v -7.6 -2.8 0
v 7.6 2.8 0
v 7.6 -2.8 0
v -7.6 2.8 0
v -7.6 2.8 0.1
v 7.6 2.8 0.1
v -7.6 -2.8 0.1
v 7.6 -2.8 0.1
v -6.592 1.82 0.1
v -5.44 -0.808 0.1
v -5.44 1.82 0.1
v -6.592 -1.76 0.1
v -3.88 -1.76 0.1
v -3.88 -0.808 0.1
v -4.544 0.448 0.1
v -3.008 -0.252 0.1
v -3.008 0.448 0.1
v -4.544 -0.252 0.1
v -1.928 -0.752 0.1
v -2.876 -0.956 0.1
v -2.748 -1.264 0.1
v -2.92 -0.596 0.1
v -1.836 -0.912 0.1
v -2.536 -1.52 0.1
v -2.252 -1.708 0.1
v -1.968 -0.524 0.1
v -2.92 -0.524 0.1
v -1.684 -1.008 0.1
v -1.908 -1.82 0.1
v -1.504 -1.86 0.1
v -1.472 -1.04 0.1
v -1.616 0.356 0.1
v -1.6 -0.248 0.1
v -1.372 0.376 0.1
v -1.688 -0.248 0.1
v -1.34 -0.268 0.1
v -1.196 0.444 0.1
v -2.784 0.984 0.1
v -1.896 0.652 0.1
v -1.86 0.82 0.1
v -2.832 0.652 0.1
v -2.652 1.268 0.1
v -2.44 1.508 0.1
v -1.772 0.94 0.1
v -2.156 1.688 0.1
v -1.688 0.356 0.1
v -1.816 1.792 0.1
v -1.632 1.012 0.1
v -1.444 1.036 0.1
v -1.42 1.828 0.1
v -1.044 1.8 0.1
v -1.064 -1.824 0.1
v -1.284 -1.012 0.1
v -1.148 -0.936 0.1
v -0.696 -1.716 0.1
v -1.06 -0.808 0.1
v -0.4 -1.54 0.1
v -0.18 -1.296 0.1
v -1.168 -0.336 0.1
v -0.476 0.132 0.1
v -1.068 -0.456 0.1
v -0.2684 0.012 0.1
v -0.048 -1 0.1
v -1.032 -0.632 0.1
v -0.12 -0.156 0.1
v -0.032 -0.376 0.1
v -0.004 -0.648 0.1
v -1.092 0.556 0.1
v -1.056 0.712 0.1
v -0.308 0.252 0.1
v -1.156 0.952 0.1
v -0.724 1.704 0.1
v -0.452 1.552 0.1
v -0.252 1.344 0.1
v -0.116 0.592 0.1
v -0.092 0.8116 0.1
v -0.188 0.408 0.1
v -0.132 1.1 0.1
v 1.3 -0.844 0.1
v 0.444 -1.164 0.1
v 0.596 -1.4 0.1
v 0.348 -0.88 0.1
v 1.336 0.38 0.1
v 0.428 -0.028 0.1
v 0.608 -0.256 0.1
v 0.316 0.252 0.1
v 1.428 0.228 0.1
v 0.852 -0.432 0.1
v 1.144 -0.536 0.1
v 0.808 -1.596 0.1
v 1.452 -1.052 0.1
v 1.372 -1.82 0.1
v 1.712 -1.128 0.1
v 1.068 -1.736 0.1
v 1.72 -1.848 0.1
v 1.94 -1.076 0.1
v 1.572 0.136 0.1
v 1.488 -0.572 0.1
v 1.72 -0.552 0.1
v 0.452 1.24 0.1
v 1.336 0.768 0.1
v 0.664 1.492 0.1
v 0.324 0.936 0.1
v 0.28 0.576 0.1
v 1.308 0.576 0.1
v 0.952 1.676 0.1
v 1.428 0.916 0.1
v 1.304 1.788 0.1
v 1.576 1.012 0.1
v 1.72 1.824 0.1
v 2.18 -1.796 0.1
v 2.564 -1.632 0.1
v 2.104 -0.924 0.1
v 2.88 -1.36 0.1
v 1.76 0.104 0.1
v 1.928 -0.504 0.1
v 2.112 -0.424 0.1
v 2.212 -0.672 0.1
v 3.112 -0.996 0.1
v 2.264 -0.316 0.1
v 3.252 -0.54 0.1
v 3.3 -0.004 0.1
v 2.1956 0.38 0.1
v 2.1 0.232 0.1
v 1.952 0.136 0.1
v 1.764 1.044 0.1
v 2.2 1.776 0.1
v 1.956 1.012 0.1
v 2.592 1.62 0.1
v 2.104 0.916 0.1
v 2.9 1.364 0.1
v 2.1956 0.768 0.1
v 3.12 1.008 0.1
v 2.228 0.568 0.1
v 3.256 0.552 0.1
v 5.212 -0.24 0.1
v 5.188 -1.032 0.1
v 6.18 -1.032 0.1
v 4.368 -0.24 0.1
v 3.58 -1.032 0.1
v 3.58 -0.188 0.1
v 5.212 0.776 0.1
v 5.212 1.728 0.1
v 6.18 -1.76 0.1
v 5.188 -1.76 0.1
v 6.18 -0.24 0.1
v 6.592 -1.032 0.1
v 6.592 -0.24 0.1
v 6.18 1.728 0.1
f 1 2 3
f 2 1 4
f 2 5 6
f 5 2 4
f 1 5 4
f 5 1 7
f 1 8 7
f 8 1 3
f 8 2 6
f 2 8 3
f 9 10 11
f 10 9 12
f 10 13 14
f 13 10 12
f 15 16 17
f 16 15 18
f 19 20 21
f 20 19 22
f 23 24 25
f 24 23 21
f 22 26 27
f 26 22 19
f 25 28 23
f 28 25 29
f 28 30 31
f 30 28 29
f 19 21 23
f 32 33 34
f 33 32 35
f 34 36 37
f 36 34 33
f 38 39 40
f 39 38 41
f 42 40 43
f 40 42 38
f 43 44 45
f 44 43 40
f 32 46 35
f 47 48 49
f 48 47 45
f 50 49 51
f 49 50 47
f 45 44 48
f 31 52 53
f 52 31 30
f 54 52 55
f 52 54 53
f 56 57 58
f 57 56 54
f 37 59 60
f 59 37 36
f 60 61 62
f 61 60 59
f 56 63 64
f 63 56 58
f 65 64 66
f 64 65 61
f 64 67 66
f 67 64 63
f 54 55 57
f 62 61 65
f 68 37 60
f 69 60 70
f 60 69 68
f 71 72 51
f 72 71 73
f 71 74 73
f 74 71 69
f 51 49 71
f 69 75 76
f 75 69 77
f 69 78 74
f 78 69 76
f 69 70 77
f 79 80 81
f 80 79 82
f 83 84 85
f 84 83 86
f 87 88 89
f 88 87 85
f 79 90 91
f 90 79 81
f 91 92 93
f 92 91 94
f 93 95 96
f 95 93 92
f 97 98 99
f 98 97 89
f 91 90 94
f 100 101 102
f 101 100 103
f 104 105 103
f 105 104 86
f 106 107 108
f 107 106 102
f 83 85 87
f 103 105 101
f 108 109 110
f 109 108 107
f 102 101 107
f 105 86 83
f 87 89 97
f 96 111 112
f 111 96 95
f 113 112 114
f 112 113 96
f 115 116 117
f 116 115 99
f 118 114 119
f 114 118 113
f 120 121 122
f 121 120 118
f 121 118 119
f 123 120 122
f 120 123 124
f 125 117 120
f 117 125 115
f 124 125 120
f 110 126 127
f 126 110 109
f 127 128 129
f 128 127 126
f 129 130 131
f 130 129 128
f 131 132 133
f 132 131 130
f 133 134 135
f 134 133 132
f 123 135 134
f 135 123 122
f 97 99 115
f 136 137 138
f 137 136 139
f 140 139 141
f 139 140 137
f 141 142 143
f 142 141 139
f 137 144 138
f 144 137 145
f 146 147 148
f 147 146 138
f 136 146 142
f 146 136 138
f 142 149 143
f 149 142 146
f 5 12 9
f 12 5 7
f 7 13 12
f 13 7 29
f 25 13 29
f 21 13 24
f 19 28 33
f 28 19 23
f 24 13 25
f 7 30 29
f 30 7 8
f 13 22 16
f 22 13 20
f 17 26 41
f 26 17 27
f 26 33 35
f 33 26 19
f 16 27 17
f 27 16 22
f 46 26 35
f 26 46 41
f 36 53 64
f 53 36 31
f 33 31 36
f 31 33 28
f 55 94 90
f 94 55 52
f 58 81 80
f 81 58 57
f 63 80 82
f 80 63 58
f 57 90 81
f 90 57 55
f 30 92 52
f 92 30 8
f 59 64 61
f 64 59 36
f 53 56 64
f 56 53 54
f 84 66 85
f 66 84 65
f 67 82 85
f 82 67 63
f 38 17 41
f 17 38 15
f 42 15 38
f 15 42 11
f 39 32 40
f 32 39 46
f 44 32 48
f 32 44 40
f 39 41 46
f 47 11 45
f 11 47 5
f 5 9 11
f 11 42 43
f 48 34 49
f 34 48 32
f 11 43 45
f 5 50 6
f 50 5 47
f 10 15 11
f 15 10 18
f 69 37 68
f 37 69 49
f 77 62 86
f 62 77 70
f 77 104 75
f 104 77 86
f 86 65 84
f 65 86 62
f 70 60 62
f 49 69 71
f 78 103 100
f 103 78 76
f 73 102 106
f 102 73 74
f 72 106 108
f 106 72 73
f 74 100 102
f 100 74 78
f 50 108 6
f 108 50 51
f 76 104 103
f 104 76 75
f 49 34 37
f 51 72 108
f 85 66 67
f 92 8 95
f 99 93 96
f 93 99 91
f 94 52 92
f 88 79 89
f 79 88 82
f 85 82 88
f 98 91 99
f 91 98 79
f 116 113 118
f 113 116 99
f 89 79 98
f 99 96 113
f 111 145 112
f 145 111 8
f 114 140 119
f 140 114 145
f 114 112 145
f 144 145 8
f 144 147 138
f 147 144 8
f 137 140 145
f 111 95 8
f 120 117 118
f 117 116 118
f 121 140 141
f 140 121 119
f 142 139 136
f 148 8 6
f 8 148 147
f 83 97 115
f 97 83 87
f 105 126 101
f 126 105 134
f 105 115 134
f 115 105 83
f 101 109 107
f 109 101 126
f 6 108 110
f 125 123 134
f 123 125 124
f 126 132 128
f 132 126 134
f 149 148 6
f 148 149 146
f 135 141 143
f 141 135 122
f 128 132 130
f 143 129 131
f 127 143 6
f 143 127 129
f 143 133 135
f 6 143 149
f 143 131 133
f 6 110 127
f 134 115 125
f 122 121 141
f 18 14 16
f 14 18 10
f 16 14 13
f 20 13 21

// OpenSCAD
// file: ../p/box5-12.scad
use <../lib.scad>
function ldraw_lib__box5_12() = [
// 0 Box with 5 Faces without Any Edges
// 0 Name: box5-12.dat
// 0 Author: Chris Dee [cwdee]
// 0 !LDRAW_ORG Primitive UPDATE 2009-02
// 0 !LICENSE Licensed under CC BY 4.0 : see CAreadme.txt
// 
// 0 BFC CERTIFY CCW
  [0,"BFC","CERTIFY"],
  [0,"BFC","CCW"],
// 
// 0 !HISTORY 2009-09-03 [PTadmin] Official Update 2009-02
// 
// 
// 4 16 1 1 1 1 1 -1 -1 1 -1 -1 1 1
  [4,16,1,1,1,1,1,-1,-1,1,-1,-1,1,1],
// 4 16 -1 0 1 1 0 1 1 1 1 -1 1 1
  [4,16,-1,0,1,1,0,1,1,1,1,-1,1,1],
// 4 16 -1 0 -1 -1 0 1 -1 1 1 -1 1 -1
  [4,16,-1,0,-1,-1,0,1,-1,1,1,-1,1,-1],
// 4 16 1 0 -1 -1 0 -1 -1 1 -1 1 1 -1
  [4,16,1,0,-1,-1,0,-1,-1,1,-1,1,1,-1],
// 4 16 1 0 1 1 0 -1 1 1 -1 1 1 1
  [4,16,1,0,1,1,0,-1,1,1,-1,1,1,1],
// 0
];
module ldraw_lib__box5_12(step=0, col=false, unit=2/5, alt=false, line=0.2, solid=!$preview)
    makepoly(ldraw_lib__box5_12(), step=step, col=col, unit=unit, alt=alt, line=line, solid=solid);
ldraw_lib__box5_12(line=0.2);
// main file
use <../lib.scad>
use <../p/box5-12.scad>
function ldraw_lib__004848b() = [
// 0 Sticker  0.7 x  1.9 with Black "L-394" on Yellow Background
// 0 Name: 004848b.dat
// 0 Author: Takeshi Takahashi [RainbowDolphin]
// 0 !LDRAW_ORG Part UPDATE 2022-04
// 0 !LICENSE Licensed under CC BY 4.0 : see CAreadme.txt
// 
// 0 BFC CERTIFY CCW
  [0,"BFC","CERTIFY"],
  [0,"BFC","CCW"],
// 
// 0 !KEYWORDS FLH 1200, Harley-Davidson, License plate, Police motorcycle
// 0 !KEYWORDS Set 394-1
// 
// 0 !HISTORY 2022-07-18 [PTadmin] Official Update 2022-04
// 
// 
// 0 // Font: Swiss721 BT Black, except hyphen
// 
// 1 16 0 -0.25 0 19 0 0 0 0.25 0 0 0 7 box5-12.dat
  [1,16,0,-0.25,0,19,0,0,0,0.25,0,0,0,7, ldraw_lib__box5_12()],
// 4 0 -16.48 -0.25 4.55 -16.48 -0.25 -4.4 -13.6 -0.25 -2.02 -13.6 -0.25 4.55
  [4,0,-16.48,-0.25,4.55,-16.48,-0.25,-4.4,-13.6,-0.25,-2.02,-13.6,-0.25,4.55],
// 4 0 -13.6 -0.25 -2.02 -16.48 -0.25 -4.4 -9.7 -0.25 -4.4 -9.7 -0.25 -2.02
  [4,0,-13.6,-0.25,-2.02,-16.48,-0.25,-4.4,-9.7,-0.25,-4.4,-9.7,-0.25,-2.02],
// 4 0 -11.36 -0.25 1.12 -11.36 -0.25 -0.63 -7.52 -0.25 -0.63 -7.52 -0.25 1.12
  [4,0,-11.36,-0.25,1.12,-11.36,-0.25,-0.63,-7.52,-0.25,-0.63,-7.52,-0.25,1.12],
// 4 0 -7.19 -0.25 -2.39 -6.87 -0.25 -3.16 -4.82 -0.25 -1.88 -7.3 -0.25 -1.49
  [4,0,-7.19,-0.25,-2.39,-6.87,-0.25,-3.16,-4.82,-0.25,-1.88,-7.3,-0.25,-1.49],
// 4 0 -4.59 -0.25 -2.28 -6.87 -0.25 -3.16 -6.34 -0.25 -3.8 -5.63 -0.25 -4.27
  [4,0,-4.59,-0.25,-2.28,-6.87,-0.25,-3.16,-6.34,-0.25,-3.8,-5.63,-0.25,-4.27],
// 4 0 -4.92 -0.25 -1.31 -7.3 -0.25 -1.31 -7.3 -0.25 -1.49 -4.82 -0.25 -1.88
  [4,0,-4.92,-0.25,-1.31,-7.3,-0.25,-1.31,-7.3,-0.25,-1.49,-4.82,-0.25,-1.88],
// 4 0 -4.21 -0.25 -2.52 -4.59 -0.25 -2.28 -5.63 -0.25 -4.27 -4.77 -0.25 -4.55
  [4,0,-4.21,-0.25,-2.52,-4.59,-0.25,-2.28,-5.63,-0.25,-4.27,-4.77,-0.25,-4.55],
// 4 0 -4.21 -0.25 -2.52 -4.77 -0.25 -4.55 -3.76 -0.25 -4.65 -3.68 -0.25 -2.6
  [4,0,-4.21,-0.25,-2.52,-4.77,-0.25,-4.55,-3.76,-0.25,-4.65,-3.68,-0.25,-2.6],
// 3 0 -4.82 -0.25 -1.88 -6.87 -0.25 -3.16 -4.59 -0.25 -2.28
  [3,0,-4.82,-0.25,-1.88,-6.87,-0.25,-3.16,-4.59,-0.25,-2.28],
// 4 0 -4.04 -0.25 0.89 -4.22 -0.25 -0.62 -4 -0.25 -0.62 -3.43 -0.25 0.94
  [4,0,-4.04,-0.25,0.89,-4.22,-0.25,-0.62,-4,-0.25,-0.62,-3.43,-0.25,0.94],
// 4 0 -3.43 -0.25 0.94 -4 -0.25 -0.62 -3.35 -0.25 -0.67 -2.99 -0.25 1.11
  [4,0,-3.43,-0.25,0.94,-4,-0.25,-0.62,-3.35,-0.25,-0.67,-2.99,-0.25,1.11],
// 4 0 -6.96 -0.25 2.46 -7.08 -0.25 1.63 -4.74 -0.25 1.63 -4.65 -0.25 2.05
  [4,0,-6.96,-0.25,2.46,-7.08,-0.25,1.63,-4.74,-0.25,1.63,-4.65,-0.25,2.05],
// 4 0 -6.63 -0.25 3.17 -6.96 -0.25 2.46 -4.65 -0.25 2.05 -6.1 -0.25 3.77
  [4,0,-6.63,-0.25,3.17,-6.96,-0.25,2.46,-4.65,-0.25,2.05,-6.1,-0.25,3.77],
// 4 0 -4.43 -0.25 2.35 -5.39 -0.25 4.22 -6.1 -0.25 3.77 -4.65 -0.25 2.05
  [4,0,-4.43,-0.25,2.35,-5.39,-0.25,4.22,-6.1,-0.25,3.77,-4.65,-0.25,2.05],
// 3 0 -4.04 -0.25 0.89 -4.22 -0.25 0.89 -4.22 -0.25 -0.62
  [3,0,-4.04,-0.25,0.89,-4.22,-0.25,0.89,-4.22,-0.25,-0.62],
// 4 0 -4.08 -0.25 2.53 -3.61 -0.25 2.59 -4.54 -0.25 4.48 -5.39 -0.25 4.22
  [4,0,-4.08,-0.25,2.53,-3.61,-0.25,2.59,-4.54,-0.25,4.48,-5.39,-0.25,4.22],
// 4 0 -3.55 -0.25 4.57 -4.54 -0.25 4.48 -3.61 -0.25 2.59 -2.61 -0.25 4.5
  [4,0,-3.55,-0.25,4.57,-4.54,-0.25,4.48,-3.61,-0.25,2.59,-2.61,-0.25,4.5],
// 3 0 -5.39 -0.25 4.22 -4.43 -0.25 2.35 -4.08 -0.25 2.53
  [3,0,-5.39,-0.25,4.22,-4.43,-0.25,2.35,-4.08,-0.25,2.53],
// 4 0 -3.21 -0.25 -2.53 -3.68 -0.25 -2.6 -3.76 -0.25 -4.65 -2.66 -0.25 -4.56
  [4,0,-3.21,-0.25,-2.53,-3.68,-0.25,-2.6,-3.76,-0.25,-4.65,-2.66,-0.25,-4.56],
// 4 0 -1.74 -0.25 -4.29 -2.87 -0.25 -2.34 -3.21 -0.25 -2.53 -2.66 -0.25 -4.56
  [4,0,-1.74,-0.25,-4.29,-2.87,-0.25,-2.34,-3.21,-0.25,-2.53,-2.66,-0.25,-4.56],
// 4 0 -2.65 -0.25 -2.02 -2.87 -0.25 -2.34 -1 -0.25 -3.85 -0.45 -0.25 -3.24
  [4,0,-2.65,-0.25,-2.02,-2.87,-0.25,-2.34,-1,-0.25,-3.85,-0.45,-0.25,-3.24],
// 4 0 -2.99 -0.25 1.11 -3.35 -0.25 -0.67 -2.92 -0.25 -0.84 -1.19 -0.25 0.33
  [4,0,-2.99,-0.25,1.11,-3.35,-0.25,-0.67,-2.92,-0.25,-0.84,-1.19,-0.25,0.33],
// 4 0 -1.19 -0.25 0.33 -2.92 -0.25 -0.84 -2.67 -0.25 -1.14 -0.671 -0.25 0.03
  [4,0,-1.19,-0.25,0.33,-2.92,-0.25,-0.84,-2.67,-0.25,-1.14,-0.671,-0.25,0.03],
// 4 0 -2.65 -0.25 -2.02 -0.45 -0.25 -3.24 -0.12 -0.25 -2.5 -2.58 -0.25 -1.58
  [4,0,-2.65,-0.25,-2.02,-0.45,-0.25,-3.24,-0.12,-0.25,-2.5,-2.58,-0.25,-1.58],
// 4 0 -0.3 -0.25 -0.39 -2.67 -0.25 -1.14 -2.58 -0.25 -1.58 -0.08 -0.25 -0.94
  [4,0,-0.3,-0.25,-0.39,-2.67,-0.25,-1.14,-2.58,-0.25,-1.58,-0.08,-0.25,-0.94],
// 4 0 -0.01 -0.25 -1.62 -0.08 -0.25 -0.94 -2.58 -0.25 -1.58 -0.12 -0.25 -2.5
  [4,0,-0.01,-0.25,-1.62,-0.08,-0.25,-0.94,-2.58,-0.25,-1.58,-0.12,-0.25,-2.5],
// 3 0 -2.87 -0.25 -2.34 -1.74 -0.25 -4.29 -1 -0.25 -3.85
  [3,0,-2.87,-0.25,-2.34,-1.74,-0.25,-4.29,-1,-0.25,-3.85],
// 3 0 -0.671 -0.25 0.03 -2.67 -0.25 -1.14 -0.3 -0.25 -0.39
  [3,0,-0.671,-0.25,0.03,-2.67,-0.25,-1.14,-0.3,-0.25,-0.39],
// 3 0 -2.73 -0.25 1.39 -2.99 -0.25 1.11 -1.19 -0.25 0.33
  [3,0,-2.73,-0.25,1.39,-2.99,-0.25,1.11,-1.19,-0.25,0.33],
// 4 0 -2.64 -0.25 1.78 -2.73 -0.25 1.39 -1.19 -0.25 0.33 -0.77 -0.25 0.63
  [4,0,-2.64,-0.25,1.78,-2.73,-0.25,1.39,-1.19,-0.25,0.33,-0.77,-0.25,0.63],
// 4 0 -2.89 -0.25 2.38 -1.13 -0.25 3.88 -1.81 -0.25 4.26 -2.61 -0.25 4.5
  [4,0,-2.89,-0.25,2.38,-1.13,-0.25,3.88,-1.81,-0.25,4.26,-2.61,-0.25,4.5],
// 4 0 -2.89 -0.25 2.38 -2.64 -0.25 1.78 -0.63 -0.25 3.36 -1.13 -0.25 3.88
  [4,0,-2.89,-0.25,2.38,-2.64,-0.25,1.78,-0.63,-0.25,3.36,-1.13,-0.25,3.88],
// 3 0 -2.61 -0.25 4.5 -3.61 -0.25 2.59 -2.89 -0.25 2.38
  [3,0,-2.61,-0.25,4.5,-3.61,-0.25,2.59,-2.89,-0.25,2.38],
// 4 0 -2.64 -0.25 1.78 -0.47 -0.25 1.02 -0.29 -0.25 1.48 -0.23 -0.25 2.029
  [4,0,-2.64,-0.25,1.78,-0.47,-0.25,1.02,-0.29,-0.25,1.48,-0.23,-0.25,2.029],
// 4 0 -0.33 -0.25 2.75 -0.63 -0.25 3.36 -2.64 -0.25 1.78 -0.23 -0.25 2.029
  [4,0,-0.33,-0.25,2.75,-0.63,-0.25,3.36,-2.64,-0.25,1.78,-0.23,-0.25,2.029],
// 3 0 -2.64 -0.25 1.78 -0.77 -0.25 0.63 -0.47 -0.25 1.02
  [3,0,-2.64,-0.25,1.78,-0.77,-0.25,0.63,-0.47,-0.25,1.02],
// 4 0 1.11 -0.25 -2.91 1.49 -0.25 -3.5 3.25 -0.25 -2.11 0.87 -0.25 -2.2
  [4,0,1.11,-0.25,-2.91,1.49,-0.25,-3.5,3.25,-0.25,-2.11,0.87,-0.25,-2.2],
// 4 0 1.07 -0.25 -0.07 1.52 -0.25 -0.64 3.34 -0.25 0.95 0.79 -0.25 0.63
  [4,0,1.07,-0.25,-0.07,1.52,-0.25,-0.64,3.34,-0.25,0.95,0.79,-0.25,0.63],
// 4 0 3.57 -0.25 0.57 1.52 -0.25 -0.64 2.13 -0.25 -1.08 2.86 -0.25 -1.34
  [4,0,3.57,-0.25,0.57,1.52,-0.25,-0.64,2.13,-0.25,-1.08,2.86,-0.25,-1.34],
// 4 0 3.25 -0.25 -2.11 1.49 -0.25 -3.5 2.02 -0.25 -3.99 3.63 -0.25 -2.63
  [4,0,3.25,-0.25,-2.11,1.49,-0.25,-3.5,2.02,-0.25,-3.99,3.63,-0.25,-2.63],
// 4 0 3.63 -0.25 -2.63 2.67 -0.25 -4.34 3.43 -0.25 -4.55 4.28 -0.25 -2.82
  [4,0,3.63,-0.25,-2.63,2.67,-0.25,-4.34,3.43,-0.25,-4.55,4.28,-0.25,-2.82],
// 4 0 4.28 -0.25 -2.82 3.43 -0.25 -4.55 4.3 -0.25 -4.62 4.85 -0.25 -2.69
  [4,0,4.28,-0.25,-2.82,3.43,-0.25,-4.55,4.3,-0.25,-4.62,4.85,-0.25,-2.69],
// 4 0 3.72 -0.25 -1.43 4.3 -0.25 -1.38 3.93 -0.25 0.34 2.86 -0.25 -1.34
  [4,0,3.72,-0.25,-1.43,4.3,-0.25,-1.38,3.93,-0.25,0.34,2.86,-0.25,-1.34],
// 3 0 3.63 -0.25 -2.63 2.02 -0.25 -3.99 2.67 -0.25 -4.34
  [3,0,3.63,-0.25,-2.63,2.02,-0.25,-3.99,2.67,-0.25,-4.34],
// 4 0 1.13 -0.25 3.1 0.81 -0.25 2.34 3.34 -0.25 1.92 1.66 -0.25 3.73
  [4,0,1.13,-0.25,3.1,0.81,-0.25,2.34,3.34,-0.25,1.92,1.66,-0.25,3.73],
// 4 0 3.27 -0.25 1.44 0.81 -0.25 2.34 0.7 -0.25 1.44 0.79 -0.25 0.63
  [4,0,3.27,-0.25,1.44,0.81,-0.25,2.34,0.7,-0.25,1.44,0.79,-0.25,0.63],
// 4 0 2.38 -0.25 4.19 1.66 -0.25 3.73 3.57 -0.25 2.29 3.26 -0.25 4.47
  [4,0,2.38,-0.25,4.19,1.66,-0.25,3.73,3.57,-0.25,2.29,3.26,-0.25,4.47],
// 3 0 3.34 -0.25 0.95 1.52 -0.25 -0.64 3.57 -0.25 0.57
  [3,0,3.34,-0.25,0.95,1.52,-0.25,-0.64,3.57,-0.25,0.57],
// 3 0 0.81 -0.25 2.34 3.27 -0.25 1.44 3.34 -0.25 1.92
  [3,0,0.81,-0.25,2.34,3.27,-0.25,1.44,3.34,-0.25,1.92],
// 4 0 3.26 -0.25 4.47 3.57 -0.25 2.29 3.94 -0.25 2.53 4.3 -0.25 4.56
  [4,0,3.26,-0.25,4.47,3.57,-0.25,2.29,3.94,-0.25,2.53,4.3,-0.25,4.56],
// 3 0 1.66 -0.25 3.73 3.34 -0.25 1.92 3.57 -0.25 2.29
  [3,0,1.66,-0.25,3.73,3.34,-0.25,1.92,3.57,-0.25,2.29],
// 3 0 3.27 -0.25 1.44 0.79 -0.25 0.63 3.34 -0.25 0.95
  [3,0,3.27,-0.25,1.44,0.79,-0.25,0.63,3.34,-0.25,0.95],
// 3 0 3.57 -0.25 0.57 2.86 -0.25 -1.34 3.93 -0.25 0.34
  [3,0,3.57,-0.25,0.57,2.86,-0.25,-1.34,3.93,-0.25,0.34],
// 4 0 4.85 -0.25 -2.69 4.3 -0.25 -4.62 5.45 -0.25 -4.49 6.41 -0.25 -4.08
  [4,0,4.85,-0.25,-2.69,4.3,-0.25,-4.62,5.45,-0.25,-4.49,6.41,-0.25,-4.08],
// 4 0 5.26 -0.25 -2.31 4.85 -0.25 -2.69 6.41 -0.25 -4.08 7.2 -0.25 -3.4
  [4,0,5.26,-0.25,-2.31,4.85,-0.25,-2.69,6.41,-0.25,-4.08,7.2,-0.25,-3.4],
// 4 0 4.4 -0.25 0.26 4.3 -0.25 -1.38 4.82 -0.25 -1.26 5.28 -0.25 -1.06
  [4,0,4.4,-0.25,0.26,4.3,-0.25,-1.38,4.82,-0.25,-1.26,5.28,-0.25,-1.06],
// 4 0 5.53 -0.25 -1.68 5.26 -0.25 -2.31 7.2 -0.25 -3.4 7.78 -0.25 -2.49
  [4,0,5.53,-0.25,-1.68,5.26,-0.25,-2.31,7.2,-0.25,-3.4,7.78,-0.25,-2.49],
// 4 0 5.66 -0.25 -0.79 5.53 -0.25 -1.68 8.13 -0.25 -1.35 8.25 -0.25 -0.01
  [4,0,5.66,-0.25,-0.79,5.53,-0.25,-1.68,8.13,-0.25,-1.35,8.25,-0.25,-0.01],
// 3 0 8.13 -0.25 -1.35 5.53 -0.25 -1.68 7.78 -0.25 -2.49
  [3,0,8.13,-0.25,-1.35,5.53,-0.25,-1.68,7.78,-0.25,-2.49],
// 4 0 5.66 -0.25 -0.79 8.25 -0.25 -0.01 5.489 -0.25 0.95 5.25 -0.25 0.58
  [4,0,5.66,-0.25,-0.79,8.25,-0.25,-0.01,5.489,-0.25,0.95,5.25,-0.25,0.58],
// 4 0 5.28 -0.25 -1.06 5.66 -0.25 -0.79 4.88 -0.25 0.34 4.4 -0.25 0.26
  [4,0,5.28,-0.25,-1.06,5.66,-0.25,-0.79,4.88,-0.25,0.34,4.4,-0.25,0.26],
// 3 0 5.25 -0.25 0.58 4.88 -0.25 0.34 5.66 -0.25 -0.79
  [3,0,5.25,-0.25,0.58,4.88,-0.25,0.34,5.66,-0.25,-0.79],
// 4 0 4.41 -0.25 2.61 5.5 -0.25 4.44 4.3 -0.25 4.56 3.94 -0.25 2.53
  [4,0,4.41,-0.25,2.61,5.5,-0.25,4.44,4.3,-0.25,4.56,3.94,-0.25,2.53],
// 4 0 5.5 -0.25 4.44 4.41 -0.25 2.61 4.89 -0.25 2.53 6.48 -0.25 4.05
  [4,0,5.5,-0.25,4.44,4.41,-0.25,2.61,4.89,-0.25,2.53,6.48,-0.25,4.05],
// 4 0 6.48 -0.25 4.05 4.89 -0.25 2.53 5.26 -0.25 2.29 7.25 -0.25 3.41
  [4,0,6.48,-0.25,4.05,4.89,-0.25,2.53,5.26,-0.25,2.29,7.25,-0.25,3.41],
// 4 0 7.25 -0.25 3.41 5.26 -0.25 2.29 5.489 -0.25 1.92 7.8 -0.25 2.52
  [4,0,7.25,-0.25,3.41,5.26,-0.25,2.29,5.489,-0.25,1.92,7.8,-0.25,2.52],
// 4 0 7.8 -0.25 2.52 5.489 -0.25 1.92 5.57 -0.25 1.42 8.14 -0.25 1.38
  [4,0,7.8,-0.25,2.52,5.489,-0.25,1.92,5.57,-0.25,1.42,8.14,-0.25,1.38],
// 4 0 8.14 -0.25 1.38 5.57 -0.25 1.42 5.489 -0.25 0.95 8.25 -0.25 -0.01
  [4,0,8.14,-0.25,1.38,5.57,-0.25,1.42,5.489,-0.25,0.95,8.25,-0.25,-0.01],
// 3 0 3.93 -0.25 0.34 4.3 -0.25 -1.38 4.4 -0.25 0.26
  [3,0,3.93,-0.25,0.34,4.3,-0.25,-1.38,4.4,-0.25,0.26],
// 4 0 12.97 -0.25 -2.58 15.45 -0.25 -2.58 13.03 -0.25 -0.6 10.92 -0.25 -0.6
  [4,0,12.97,-0.25,-2.58,15.45,-0.25,-2.58,13.03,-0.25,-0.6,10.92,-0.25,-0.6],
// 4 0 8.95 -0.25 -2.58 12.97 -0.25 -2.58 10.92 -0.25 -0.6 8.95 -0.25 -0.47
  [4,0,8.95,-0.25,-2.58,12.97,-0.25,-2.58,10.92,-0.25,-0.6,8.95,-0.25,-0.47],
// 4 0 13.03 -0.25 1.94 13.03 -0.25 4.32 8.95 -0.25 -0.47 10.92 -0.25 -0.6
  [4,0,13.03,-0.25,1.94,13.03,-0.25,4.32,8.95,-0.25,-0.47,10.92,-0.25,-0.6],
// 4 0 12.97 -0.25 -2.58 12.97 -0.25 -4.4 15.45 -0.25 -4.4 15.45 -0.25 -2.58
  [4,0,12.97,-0.25,-2.58,12.97,-0.25,-4.4,15.45,-0.25,-4.4,15.45,-0.25,-2.58],
// 4 0 15.45 -0.25 -2.58 16.48 -0.25 -2.58 16.48 -0.25 -0.6 15.45 -0.25 -0.6
  [4,0,15.45,-0.25,-2.58,16.48,-0.25,-2.58,16.48,-0.25,-0.6,15.45,-0.25,-0.6],
// 4 0 13.03 -0.25 -0.6 15.45 -0.25 -2.58 15.45 -0.25 -0.6 13.03 -0.25 1.94
  [4,0,13.03,-0.25,-0.6,15.45,-0.25,-2.58,15.45,-0.25,-0.6,13.03,-0.25,1.94],
// 4 0 13.03 -0.25 1.94 15.45 -0.25 -0.6 15.45 -0.25 4.32 13.03 -0.25 4.32
  [4,0,13.03,-0.25,1.94,15.45,-0.25,-0.6,15.45,-0.25,4.32,13.03,-0.25,4.32],
// 4 14 -19 -0.25 -7 -16.48 -0.25 -4.4 -16.48 -0.25 4.55 -19 -0.25 7
  [4,14,-19,-0.25,-7,-16.48,-0.25,-4.4,-16.48,-0.25,4.55,-19,-0.25,7],
// 4 14 -9.7 -0.25 -4.4 -16.48 -0.25 -4.4 -19 -0.25 -7 -4.77 -0.25 -4.55
  [4,14,-9.7,-0.25,-4.4,-16.48,-0.25,-4.4,-19,-0.25,-7,-4.77,-0.25,-4.55],
// 3 14 -5.63 -0.25 -4.27 -9.7 -0.25 -4.4 -4.77 -0.25 -4.55
  [3,14,-5.63,-0.25,-4.27,-9.7,-0.25,-4.4,-4.77,-0.25,-4.55],
// 3 14 -6.87 -0.25 -3.16 -9.7 -0.25 -4.4 -6.34 -0.25 -3.8
  [3,14,-6.87,-0.25,-3.16,-9.7,-0.25,-4.4,-6.34,-0.25,-3.8],
// 4 14 -4.82 -0.25 -1.88 -4.59 -0.25 -2.28 -4.21 -0.25 -2.52 -4 -0.25 -0.62
  [4,14,-4.82,-0.25,-1.88,-4.59,-0.25,-2.28,-4.21,-0.25,-2.52,-4,-0.25,-0.62],
// 3 14 -6.34 -0.25 -3.8 -9.7 -0.25 -4.4 -5.63 -0.25 -4.27
  [3,14,-6.34,-0.25,-3.8,-9.7,-0.25,-4.4,-5.63,-0.25,-4.27],
// 4 14 -3.76 -0.25 -4.65 -4.77 -0.25 -4.55 -19 -0.25 -7 19 -0.25 -7
  [4,14,-3.76,-0.25,-4.65,-4.77,-0.25,-4.55,-19,-0.25,-7,19,-0.25,-7],
// 4 14 -7.19 -0.25 -2.39 -7.3 -0.25 -1.49 -7.52 -0.25 -0.63 -9.7 -0.25 -4.4
  [4,14,-7.19,-0.25,-2.39,-7.3,-0.25,-1.49,-7.52,-0.25,-0.63,-9.7,-0.25,-4.4],
// 4 14 -7.3 -0.25 -1.31 -4.92 -0.25 -1.31 -7.08 -0.25 1.63 -7.52 -0.25 1.12
  [4,14,-7.3,-0.25,-1.31,-4.92,-0.25,-1.31,-7.08,-0.25,1.63,-7.52,-0.25,1.12],
// 4 14 -4 -0.25 -0.62 -4.22 -0.25 -0.62 -4.92 -0.25 -1.31 -4.82 -0.25 -1.88
  [4,14,-4,-0.25,-0.62,-4.22,-0.25,-0.62,-4.92,-0.25,-1.31,-4.82,-0.25,-1.88],
// 4 14 -7.3 -0.25 -1.31 -7.52 -0.25 1.12 -7.52 -0.25 -0.63 -7.3 -0.25 -1.49
  [4,14,-7.3,-0.25,-1.31,-7.52,-0.25,1.12,-7.52,-0.25,-0.63,-7.3,-0.25,-1.49],
// 4 14 -4.92 -0.25 -1.31 -4.22 -0.25 -0.62 -4.22 -0.25 0.89 -7.08 -0.25 1.63
  [4,14,-4.92,-0.25,-1.31,-4.22,-0.25,-0.62,-4.22,-0.25,0.89,-7.08,-0.25,1.63],
// 4 14 -3.35 -0.25 -0.67 -3.68 -0.25 -2.6 -3.21 -0.25 -2.53 -2.58 -0.25 -1.58
  [4,14,-3.35,-0.25,-0.67,-3.68,-0.25,-2.6,-3.21,-0.25,-2.53,-2.58,-0.25,-1.58],
// 4 14 -4 -0.25 -0.62 -4.21 -0.25 -2.52 -3.68 -0.25 -2.6 -3.35 -0.25 -0.67
  [4,14,-4,-0.25,-0.62,-4.21,-0.25,-2.52,-3.68,-0.25,-2.6,-3.35,-0.25,-0.67],
// 4 14 -1.74 -0.25 -4.29 -2.66 -0.25 -4.56 2.67 -0.25 -4.34 2.02 -0.25 -3.99
  [4,14,-1.74,-0.25,-4.29,-2.66,-0.25,-4.56,2.67,-0.25,-4.34,2.02,-0.25,-3.99],
// 4 14 -0.45 -0.25 -3.24 -1 -0.25 -3.85 1.49 -0.25 -3.5 1.11 -0.25 -2.91
  [4,14,-0.45,-0.25,-3.24,-1,-0.25,-3.85,1.49,-0.25,-3.5,1.11,-0.25,-2.91],
// 4 14 -0.12 -0.25 -2.5 -0.45 -0.25 -3.24 1.11 -0.25 -2.91 0.87 -0.25 -2.2
  [4,14,-0.12,-0.25,-2.5,-0.45,-0.25,-3.24,1.11,-0.25,-2.91,0.87,-0.25,-2.2],
// 4 14 -1 -0.25 -3.85 -1.74 -0.25 -4.29 2.02 -0.25 -3.99 1.49 -0.25 -3.5
  [4,14,-1,-0.25,-3.85,-1.74,-0.25,-4.29,2.02,-0.25,-3.99,1.49,-0.25,-3.5],
// 4 14 -2.66 -0.25 -4.56 -3.76 -0.25 -4.65 19 -0.25 -7 3.43 -0.25 -4.55
  [4,14,-2.66,-0.25,-4.56,-3.76,-0.25,-4.65,19,-0.25,-7,3.43,-0.25,-4.55],
// 4 14 -2.92 -0.25 -0.84 -3.35 -0.25 -0.67 -2.58 -0.25 -1.58 -2.67 -0.25 -1.14
  [4,14,-2.92,-0.25,-0.84,-3.35,-0.25,-0.67,-2.58,-0.25,-1.58,-2.67,-0.25,-1.14],
// 4 14 -3.21 -0.25 -2.53 -2.87 -0.25 -2.34 -2.65 -0.25 -2.02 -2.58 -0.25 -1.58
  [4,14,-3.21,-0.25,-2.53,-2.87,-0.25,-2.34,-2.65,-0.25,-2.02,-2.58,-0.25,-1.58],
// 4 14 1.07 -0.25 -0.07 -0.3 -0.25 -0.39 -0.08 -0.25 -0.94 1.52 -0.25 -0.64
  [4,14,1.07,-0.25,-0.07,-0.3,-0.25,-0.39,-0.08,-0.25,-0.94,1.52,-0.25,-0.64],
// 4 14 -0.01 -0.25 -1.62 -0.12 -0.25 -2.5 0.87 -0.25 -2.2 1.52 -0.25 -0.64
  [4,14,-0.01,-0.25,-1.62,-0.12,-0.25,-2.5,0.87,-0.25,-2.2,1.52,-0.25,-0.64],
// 4 14 -6.96 -0.25 2.46 -11.36 -0.25 1.12 -7.52 -0.25 1.12 -7.08 -0.25 1.63
  [4,14,-6.96,-0.25,2.46,-11.36,-0.25,1.12,-7.52,-0.25,1.12,-7.08,-0.25,1.63],
// 4 14 -11.36 -0.25 1.12 -6.96 -0.25 2.46 -6.63 -0.25 3.17 -13.6 -0.25 4.55
  [4,14,-11.36,-0.25,1.12,-6.96,-0.25,2.46,-6.63,-0.25,3.17,-13.6,-0.25,4.55],
// 4 14 -4.74 -0.25 1.63 -4.22 -0.25 0.89 -4.04 -0.25 0.89 -4.65 -0.25 2.05
  [4,14,-4.74,-0.25,1.63,-4.22,-0.25,0.89,-4.04,-0.25,0.89,-4.65,-0.25,2.05],
// 4 14 -4.08 -0.25 2.53 -4.43 -0.25 2.35 -4.65 -0.25 2.05 -4.04 -0.25 0.89
  [4,14,-4.08,-0.25,2.53,-4.43,-0.25,2.35,-4.65,-0.25,2.05,-4.04,-0.25,0.89],
// 3 14 -4.74 -0.25 1.63 -7.08 -0.25 1.63 -4.22 -0.25 0.89
  [3,14,-4.74,-0.25,1.63,-7.08,-0.25,1.63,-4.22,-0.25,0.89],
// 4 14 -19 -0.25 7 -13.6 -0.25 4.55 -5.39 -0.25 4.22 -4.54 -0.25 4.48
  [4,14,-19,-0.25,7,-13.6,-0.25,4.55,-5.39,-0.25,4.22,-4.54,-0.25,4.48],
// 3 14 -19 -0.25 7 -16.48 -0.25 4.55 -13.6 -0.25 4.55
  [3,14,-19,-0.25,7,-16.48,-0.25,4.55,-13.6,-0.25,4.55],
// 3 14 -13.6 -0.25 4.55 -6.63 -0.25 3.17 -6.1 -0.25 3.77
  [3,14,-13.6,-0.25,4.55,-6.63,-0.25,3.17,-6.1,-0.25,3.77],
// 4 14 -3.43 -0.25 0.94 -3.61 -0.25 2.59 -4.08 -0.25 2.53 -4.04 -0.25 0.89
  [4,14,-3.43,-0.25,0.94,-3.61,-0.25,2.59,-4.08,-0.25,2.53,-4.04,-0.25,0.89],
// 3 14 -13.6 -0.25 4.55 -6.1 -0.25 3.77 -5.39 -0.25 4.22
  [3,14,-13.6,-0.25,4.55,-6.1,-0.25,3.77,-5.39,-0.25,4.22],
// 4 14 -19 -0.25 7 -4.54 -0.25 4.48 -3.55 -0.25 4.57 19 -0.25 7
  [4,14,-19,-0.25,7,-4.54,-0.25,4.48,-3.55,-0.25,4.57,19,-0.25,7],
// 4 14 -11.36 -0.25 1.12 -13.6 -0.25 4.55 -13.6 -0.25 -2.02 -11.36 -0.25 -0.63
  [4,14,-11.36,-0.25,1.12,-13.6,-0.25,4.55,-13.6,-0.25,-2.02,-11.36,-0.25,-0.63],
// 4 14 -2.64 -0.25 1.78 -3.61 -0.25 2.59 -2.99 -0.25 1.11 -2.73 -0.25 1.39
  [4,14,-2.64,-0.25,1.78,-3.61,-0.25,2.59,-2.99,-0.25,1.11,-2.73,-0.25,1.39],
// 4 14 -0.671 -0.25 0.03 0.79 -0.25 0.63 -0.47 -0.25 1.02 -0.77 -0.25 0.63
  [4,14,-0.671,-0.25,0.03,0.79,-0.25,0.63,-0.47,-0.25,1.02,-0.77,-0.25,0.63],
// 4 14 0.7 -0.25 1.44 -0.29 -0.25 1.48 -0.47 -0.25 1.02 0.79 -0.25 0.63
  [4,14,0.7,-0.25,1.44,-0.29,-0.25,1.48,-0.47,-0.25,1.02,0.79,-0.25,0.63],
// 4 14 0.79 -0.25 0.63 -0.671 -0.25 0.03 -0.3 -0.25 -0.39 1.07 -0.25 -0.07
  [4,14,0.79,-0.25,0.63,-0.671,-0.25,0.03,-0.3,-0.25,-0.39,1.07,-0.25,-0.07],
// 3 14 -0.77 -0.25 0.63 -1.19 -0.25 0.33 -0.671 -0.25 0.03
  [3,14,-0.77,-0.25,0.63,-1.19,-0.25,0.33,-0.671,-0.25,0.03],
// 3 14 -3.61 -0.25 2.59 -2.64 -0.25 1.78 -2.89 -0.25 2.38
  [3,14,-3.61,-0.25,2.59,-2.64,-0.25,1.78,-2.89,-0.25,2.38],
// 4 14 -0.33 -0.25 2.75 -0.23 -0.25 2.029 0.81 -0.25 2.34 1.13 -0.25 3.1
  [4,14,-0.33,-0.25,2.75,-0.23,-0.25,2.029,0.81,-0.25,2.34,1.13,-0.25,3.1],
// 4 14 -1.13 -0.25 3.88 -0.63 -0.25 3.36 1.66 -0.25 3.73 2.38 -0.25 4.19
  [4,14,-1.13,-0.25,3.88,-0.63,-0.25,3.36,1.66,-0.25,3.73,2.38,-0.25,4.19],
// 4 14 -1.81 -0.25 4.26 -1.13 -0.25 3.88 2.38 -0.25 4.19 3.26 -0.25 4.47
  [4,14,-1.81,-0.25,4.26,-1.13,-0.25,3.88,2.38,-0.25,4.19,3.26,-0.25,4.47],
// 4 14 -0.63 -0.25 3.36 -0.33 -0.25 2.75 1.13 -0.25 3.1 1.66 -0.25 3.73
  [4,14,-0.63,-0.25,3.36,-0.33,-0.25,2.75,1.13,-0.25,3.1,1.66,-0.25,3.73],
// 4 14 19 -0.25 7 -3.55 -0.25 4.57 -2.61 -0.25 4.5 3.26 -0.25 4.47
  [4,14,19,-0.25,7,-3.55,-0.25,4.57,-2.61,-0.25,4.5,3.26,-0.25,4.47],
// 4 14 -0.23 -0.25 2.029 -0.29 -0.25 1.48 0.7 -0.25 1.44 0.81 -0.25 2.34
  [4,14,-0.23,-0.25,2.029,-0.29,-0.25,1.48,0.7,-0.25,1.44,0.81,-0.25,2.34],
// 3 14 -3.61 -0.25 2.59 -3.43 -0.25 0.94 -2.99 -0.25 1.11
  [3,14,-3.61,-0.25,2.59,-3.43,-0.25,0.94,-2.99,-0.25,1.11],
// 3 14 -2.61 -0.25 4.5 -1.81 -0.25 4.26 3.26 -0.25 4.47
  [3,14,-2.61,-0.25,4.5,-1.81,-0.25,4.26,3.26,-0.25,4.47],
// 3 14 1.52 -0.25 -0.64 -0.08 -0.25 -0.94 -0.01 -0.25 -1.62
  [3,14,1.52,-0.25,-0.64,-0.08,-0.25,-0.94,-0.01,-0.25,-1.62],
// 3 14 3.43 -0.25 -4.55 19 -0.25 -7 4.3 -0.25 -4.62
  [3,14,3.43,-0.25,-4.55,19,-0.25,-7,4.3,-0.25,-4.62],
// 4 14 4.3 -0.25 -1.38 3.63 -0.25 -2.63 4.28 -0.25 -2.82 4.85 -0.25 -2.69
  [4,14,4.3,-0.25,-1.38,3.63,-0.25,-2.63,4.28,-0.25,-2.82,4.85,-0.25,-2.69],
// 3 14 2.67 -0.25 -4.34 -2.66 -0.25 -4.56 3.43 -0.25 -4.55
  [3,14,2.67,-0.25,-4.34,-2.66,-0.25,-4.56,3.43,-0.25,-4.55],
// 4 14 3.25 -0.25 -2.11 2.86 -0.25 -1.34 2.13 -0.25 -1.08 0.87 -0.25 -2.2
  [4,14,3.25,-0.25,-2.11,2.86,-0.25,-1.34,2.13,-0.25,-1.08,0.87,-0.25,-2.2],
// 3 14 1.52 -0.25 -0.64 0.87 -0.25 -2.2 2.13 -0.25 -1.08
  [3,14,1.52,-0.25,-0.64,0.87,-0.25,-2.2,2.13,-0.25,-1.08],
// 4 14 3.63 -0.25 -2.63 4.3 -0.25 -1.38 3.72 -0.25 -1.43 3.25 -0.25 -2.11
  [4,14,3.63,-0.25,-2.63,4.3,-0.25,-1.38,3.72,-0.25,-1.43,3.25,-0.25,-2.11],
// 4 14 4.82 -0.25 -1.26 4.3 -0.25 -1.38 5.26 -0.25 -2.31 5.53 -0.25 -1.68
  [4,14,4.82,-0.25,-1.26,4.3,-0.25,-1.38,5.26,-0.25,-2.31,5.53,-0.25,-1.68],
// 3 14 2.86 -0.25 -1.34 3.25 -0.25 -2.11 3.72 -0.25 -1.43
  [3,14,2.86,-0.25,-1.34,3.25,-0.25,-2.11,3.72,-0.25,-1.43],
// 3 14 4.3 -0.25 -1.38 4.85 -0.25 -2.69 5.26 -0.25 -2.31
  [3,14,4.3,-0.25,-1.38,4.85,-0.25,-2.69,5.26,-0.25,-2.31],
// 4 14 12.97 -0.25 -4.4 6.41 -0.25 -4.08 5.45 -0.25 -4.49 19 -0.25 -7
  [4,14,12.97,-0.25,-4.4,6.41,-0.25,-4.08,5.45,-0.25,-4.49,19,-0.25,-7],
// 4 14 8.95 -0.25 -2.58 7.78 -0.25 -2.49 7.2 -0.25 -3.4 12.97 -0.25 -4.4
  [4,14,8.95,-0.25,-2.58,7.78,-0.25,-2.49,7.2,-0.25,-3.4,12.97,-0.25,-4.4],
// 3 14 7.2 -0.25 -3.4 6.41 -0.25 -4.08 12.97 -0.25 -4.4
  [3,14,7.2,-0.25,-3.4,6.41,-0.25,-4.08,12.97,-0.25,-4.4],
// 3 14 15.45 -0.25 -4.4 12.97 -0.25 -4.4 19 -0.25 -7
  [3,14,15.45,-0.25,-4.4,12.97,-0.25,-4.4,19,-0.25,-7],
// 4 14 16.48 -0.25 -2.58 15.45 -0.25 -2.58 15.45 -0.25 -4.4 19 -0.25 -7
  [4,14,16.48,-0.25,-2.58,15.45,-0.25,-2.58,15.45,-0.25,-4.4,19,-0.25,-7],
// 3 14 12.97 -0.25 -2.58 8.95 -0.25 -2.58 12.97 -0.25 -4.4
  [3,14,12.97,-0.25,-2.58,8.95,-0.25,-2.58,12.97,-0.25,-4.4],
// 3 14 5.45 -0.25 -4.49 4.3 -0.25 -4.62 19 -0.25 -7
  [3,14,5.45,-0.25,-4.49,4.3,-0.25,-4.62,19,-0.25,-7],
// 3 14 5.66 -0.25 -0.79 5.28 -0.25 -1.06 5.53 -0.25 -1.68
  [3,14,5.66,-0.25,-0.79,5.28,-0.25,-1.06,5.53,-0.25,-1.68],
// 3 14 5.28 -0.25 -1.06 4.82 -0.25 -1.26 5.53 -0.25 -1.68
  [3,14,5.28,-0.25,-1.06,4.82,-0.25,-1.26,5.53,-0.25,-1.68],
// 4 14 8.13 -0.25 -1.35 7.78 -0.25 -2.49 8.95 -0.25 -2.58 8.95 -0.25 -0.47
  [4,14,8.13,-0.25,-1.35,7.78,-0.25,-2.49,8.95,-0.25,-2.58,8.95,-0.25,-0.47],
// 3 14 13.03 -0.25 1.94 10.92 -0.25 -0.6 13.03 -0.25 -0.6
  [3,14,13.03,-0.25,1.94,10.92,-0.25,-0.6,13.03,-0.25,-0.6],
// 4 14 16.48 -0.25 -0.6 16.48 -0.25 -2.58 19 -0.25 -7 19 -0.25 7
  [4,14,16.48,-0.25,-0.6,16.48,-0.25,-2.58,19,-0.25,-7,19,-0.25,7],
// 4 14 3.93 -0.25 0.34 4.4 -0.25 0.26 3.34 -0.25 0.95 3.57 -0.25 0.57
  [4,14,3.93,-0.25,0.34,4.4,-0.25,0.26,3.34,-0.25,0.95,3.57,-0.25,0.57],
// 4 14 4.41 -0.25 2.61 3.34 -0.25 1.92 3.27 -0.25 1.44 5.57 -0.25 1.42
  [4,14,4.41,-0.25,2.61,3.34,-0.25,1.92,3.27,-0.25,1.44,5.57,-0.25,1.42],
// 4 14 3.27 -0.25 1.44 3.34 -0.25 0.95 4.4 -0.25 0.26 5.57 -0.25 1.42
  [4,14,3.27,-0.25,1.44,3.34,-0.25,0.95,4.4,-0.25,0.26,5.57,-0.25,1.42],
// 4 14 3.94 -0.25 2.53 3.57 -0.25 2.29 3.34 -0.25 1.92 4.41 -0.25 2.61
  [4,14,3.94,-0.25,2.53,3.57,-0.25,2.29,3.34,-0.25,1.92,4.41,-0.25,2.61],
// 3 14 19 -0.25 7 3.26 -0.25 4.47 4.3 -0.25 4.56
  [3,14,19,-0.25,7,3.26,-0.25,4.47,4.3,-0.25,4.56],
// 4 14 4.88 -0.25 0.34 5.25 -0.25 0.58 5.489 -0.25 0.95 5.57 -0.25 1.42
  [4,14,4.88,-0.25,0.34,5.25,-0.25,0.58,5.489,-0.25,0.95,5.57,-0.25,1.42],
// 4 14 4.41 -0.25 2.61 5.57 -0.25 1.42 5.489 -0.25 1.92 4.89 -0.25 2.53
  [4,14,4.41,-0.25,2.61,5.57,-0.25,1.42,5.489,-0.25,1.92,4.89,-0.25,2.53],
// 4 14 15.45 -0.25 4.32 15.45 -0.25 -0.6 16.48 -0.25 -0.6 19 -0.25 7
  [4,14,15.45,-0.25,4.32,15.45,-0.25,-0.6,16.48,-0.25,-0.6,19,-0.25,7],
// 4 14 8.14 -0.25 1.38 8.25 -0.25 -0.01 8.95 -0.25 -0.47 13.03 -0.25 4.32
  [4,14,8.14,-0.25,1.38,8.25,-0.25,-0.01,8.95,-0.25,-0.47,13.03,-0.25,4.32],
// 3 14 4.89 -0.25 2.53 5.489 -0.25 1.92 5.26 -0.25 2.29
  [3,14,4.89,-0.25,2.53,5.489,-0.25,1.92,5.26,-0.25,2.29],
// 3 14 13.03 -0.25 4.32 6.48 -0.25 4.05 7.25 -0.25 3.41
  [3,14,13.03,-0.25,4.32,6.48,-0.25,4.05,7.25,-0.25,3.41],
// 4 14 5.5 -0.25 4.44 6.48 -0.25 4.05 13.03 -0.25 4.32 19 -0.25 7
  [4,14,5.5,-0.25,4.44,6.48,-0.25,4.05,13.03,-0.25,4.32,19,-0.25,7],
// 3 14 13.03 -0.25 4.32 7.8 -0.25 2.52 8.14 -0.25 1.38
  [3,14,13.03,-0.25,4.32,7.8,-0.25,2.52,8.14,-0.25,1.38],
// 3 14 19 -0.25 7 13.03 -0.25 4.32 15.45 -0.25 4.32
  [3,14,19,-0.25,7,13.03,-0.25,4.32,15.45,-0.25,4.32],
// 3 14 13.03 -0.25 4.32 7.25 -0.25 3.41 7.8 -0.25 2.52
  [3,14,13.03,-0.25,4.32,7.25,-0.25,3.41,7.8,-0.25,2.52],
// 3 14 19 -0.25 7 4.3 -0.25 4.56 5.5 -0.25 4.44
  [3,14,19,-0.25,7,4.3,-0.25,4.56,5.5,-0.25,4.44],
// 3 14 5.57 -0.25 1.42 4.4 -0.25 0.26 4.88 -0.25 0.34
  [3,14,5.57,-0.25,1.42,4.4,-0.25,0.26,4.88,-0.25,0.34],
// 3 14 8.25 -0.25 -0.01 8.13 -0.25 -1.35 8.95 -0.25 -0.47
  [3,14,8.25,-0.25,-0.01,8.13,-0.25,-1.35,8.95,-0.25,-0.47],
// 4 14 -11.36 -0.25 -0.63 -13.6 -0.25 -2.02 -9.7 -0.25 -2.02 -7.52 -0.25 -0.63
  [4,14,-11.36,-0.25,-0.63,-13.6,-0.25,-2.02,-9.7,-0.25,-2.02,-7.52,-0.25,-0.63],
// 3 14 -7.52 -0.25 -0.63 -9.7 -0.25 -2.02 -9.7 -0.25 -4.4
  [3,14,-7.52,-0.25,-0.63,-9.7,-0.25,-2.02,-9.7,-0.25,-4.4],
// 3 14 -7.19 -0.25 -2.39 -9.7 -0.25 -4.4 -6.87 -0.25 -3.16
  [3,14,-7.19,-0.25,-2.39,-9.7,-0.25,-4.4,-6.87,-0.25,-3.16],
];
module ldraw_lib__004848b(step=0, col=false, unit=2/5, alt=false, line=0.2, solid=!$preview)
    makepoly(ldraw_lib__004848b(), step=step, col=col, unit=unit, alt=alt, line=line, solid=solid);
ldraw_lib__004848b(line=0.2);
